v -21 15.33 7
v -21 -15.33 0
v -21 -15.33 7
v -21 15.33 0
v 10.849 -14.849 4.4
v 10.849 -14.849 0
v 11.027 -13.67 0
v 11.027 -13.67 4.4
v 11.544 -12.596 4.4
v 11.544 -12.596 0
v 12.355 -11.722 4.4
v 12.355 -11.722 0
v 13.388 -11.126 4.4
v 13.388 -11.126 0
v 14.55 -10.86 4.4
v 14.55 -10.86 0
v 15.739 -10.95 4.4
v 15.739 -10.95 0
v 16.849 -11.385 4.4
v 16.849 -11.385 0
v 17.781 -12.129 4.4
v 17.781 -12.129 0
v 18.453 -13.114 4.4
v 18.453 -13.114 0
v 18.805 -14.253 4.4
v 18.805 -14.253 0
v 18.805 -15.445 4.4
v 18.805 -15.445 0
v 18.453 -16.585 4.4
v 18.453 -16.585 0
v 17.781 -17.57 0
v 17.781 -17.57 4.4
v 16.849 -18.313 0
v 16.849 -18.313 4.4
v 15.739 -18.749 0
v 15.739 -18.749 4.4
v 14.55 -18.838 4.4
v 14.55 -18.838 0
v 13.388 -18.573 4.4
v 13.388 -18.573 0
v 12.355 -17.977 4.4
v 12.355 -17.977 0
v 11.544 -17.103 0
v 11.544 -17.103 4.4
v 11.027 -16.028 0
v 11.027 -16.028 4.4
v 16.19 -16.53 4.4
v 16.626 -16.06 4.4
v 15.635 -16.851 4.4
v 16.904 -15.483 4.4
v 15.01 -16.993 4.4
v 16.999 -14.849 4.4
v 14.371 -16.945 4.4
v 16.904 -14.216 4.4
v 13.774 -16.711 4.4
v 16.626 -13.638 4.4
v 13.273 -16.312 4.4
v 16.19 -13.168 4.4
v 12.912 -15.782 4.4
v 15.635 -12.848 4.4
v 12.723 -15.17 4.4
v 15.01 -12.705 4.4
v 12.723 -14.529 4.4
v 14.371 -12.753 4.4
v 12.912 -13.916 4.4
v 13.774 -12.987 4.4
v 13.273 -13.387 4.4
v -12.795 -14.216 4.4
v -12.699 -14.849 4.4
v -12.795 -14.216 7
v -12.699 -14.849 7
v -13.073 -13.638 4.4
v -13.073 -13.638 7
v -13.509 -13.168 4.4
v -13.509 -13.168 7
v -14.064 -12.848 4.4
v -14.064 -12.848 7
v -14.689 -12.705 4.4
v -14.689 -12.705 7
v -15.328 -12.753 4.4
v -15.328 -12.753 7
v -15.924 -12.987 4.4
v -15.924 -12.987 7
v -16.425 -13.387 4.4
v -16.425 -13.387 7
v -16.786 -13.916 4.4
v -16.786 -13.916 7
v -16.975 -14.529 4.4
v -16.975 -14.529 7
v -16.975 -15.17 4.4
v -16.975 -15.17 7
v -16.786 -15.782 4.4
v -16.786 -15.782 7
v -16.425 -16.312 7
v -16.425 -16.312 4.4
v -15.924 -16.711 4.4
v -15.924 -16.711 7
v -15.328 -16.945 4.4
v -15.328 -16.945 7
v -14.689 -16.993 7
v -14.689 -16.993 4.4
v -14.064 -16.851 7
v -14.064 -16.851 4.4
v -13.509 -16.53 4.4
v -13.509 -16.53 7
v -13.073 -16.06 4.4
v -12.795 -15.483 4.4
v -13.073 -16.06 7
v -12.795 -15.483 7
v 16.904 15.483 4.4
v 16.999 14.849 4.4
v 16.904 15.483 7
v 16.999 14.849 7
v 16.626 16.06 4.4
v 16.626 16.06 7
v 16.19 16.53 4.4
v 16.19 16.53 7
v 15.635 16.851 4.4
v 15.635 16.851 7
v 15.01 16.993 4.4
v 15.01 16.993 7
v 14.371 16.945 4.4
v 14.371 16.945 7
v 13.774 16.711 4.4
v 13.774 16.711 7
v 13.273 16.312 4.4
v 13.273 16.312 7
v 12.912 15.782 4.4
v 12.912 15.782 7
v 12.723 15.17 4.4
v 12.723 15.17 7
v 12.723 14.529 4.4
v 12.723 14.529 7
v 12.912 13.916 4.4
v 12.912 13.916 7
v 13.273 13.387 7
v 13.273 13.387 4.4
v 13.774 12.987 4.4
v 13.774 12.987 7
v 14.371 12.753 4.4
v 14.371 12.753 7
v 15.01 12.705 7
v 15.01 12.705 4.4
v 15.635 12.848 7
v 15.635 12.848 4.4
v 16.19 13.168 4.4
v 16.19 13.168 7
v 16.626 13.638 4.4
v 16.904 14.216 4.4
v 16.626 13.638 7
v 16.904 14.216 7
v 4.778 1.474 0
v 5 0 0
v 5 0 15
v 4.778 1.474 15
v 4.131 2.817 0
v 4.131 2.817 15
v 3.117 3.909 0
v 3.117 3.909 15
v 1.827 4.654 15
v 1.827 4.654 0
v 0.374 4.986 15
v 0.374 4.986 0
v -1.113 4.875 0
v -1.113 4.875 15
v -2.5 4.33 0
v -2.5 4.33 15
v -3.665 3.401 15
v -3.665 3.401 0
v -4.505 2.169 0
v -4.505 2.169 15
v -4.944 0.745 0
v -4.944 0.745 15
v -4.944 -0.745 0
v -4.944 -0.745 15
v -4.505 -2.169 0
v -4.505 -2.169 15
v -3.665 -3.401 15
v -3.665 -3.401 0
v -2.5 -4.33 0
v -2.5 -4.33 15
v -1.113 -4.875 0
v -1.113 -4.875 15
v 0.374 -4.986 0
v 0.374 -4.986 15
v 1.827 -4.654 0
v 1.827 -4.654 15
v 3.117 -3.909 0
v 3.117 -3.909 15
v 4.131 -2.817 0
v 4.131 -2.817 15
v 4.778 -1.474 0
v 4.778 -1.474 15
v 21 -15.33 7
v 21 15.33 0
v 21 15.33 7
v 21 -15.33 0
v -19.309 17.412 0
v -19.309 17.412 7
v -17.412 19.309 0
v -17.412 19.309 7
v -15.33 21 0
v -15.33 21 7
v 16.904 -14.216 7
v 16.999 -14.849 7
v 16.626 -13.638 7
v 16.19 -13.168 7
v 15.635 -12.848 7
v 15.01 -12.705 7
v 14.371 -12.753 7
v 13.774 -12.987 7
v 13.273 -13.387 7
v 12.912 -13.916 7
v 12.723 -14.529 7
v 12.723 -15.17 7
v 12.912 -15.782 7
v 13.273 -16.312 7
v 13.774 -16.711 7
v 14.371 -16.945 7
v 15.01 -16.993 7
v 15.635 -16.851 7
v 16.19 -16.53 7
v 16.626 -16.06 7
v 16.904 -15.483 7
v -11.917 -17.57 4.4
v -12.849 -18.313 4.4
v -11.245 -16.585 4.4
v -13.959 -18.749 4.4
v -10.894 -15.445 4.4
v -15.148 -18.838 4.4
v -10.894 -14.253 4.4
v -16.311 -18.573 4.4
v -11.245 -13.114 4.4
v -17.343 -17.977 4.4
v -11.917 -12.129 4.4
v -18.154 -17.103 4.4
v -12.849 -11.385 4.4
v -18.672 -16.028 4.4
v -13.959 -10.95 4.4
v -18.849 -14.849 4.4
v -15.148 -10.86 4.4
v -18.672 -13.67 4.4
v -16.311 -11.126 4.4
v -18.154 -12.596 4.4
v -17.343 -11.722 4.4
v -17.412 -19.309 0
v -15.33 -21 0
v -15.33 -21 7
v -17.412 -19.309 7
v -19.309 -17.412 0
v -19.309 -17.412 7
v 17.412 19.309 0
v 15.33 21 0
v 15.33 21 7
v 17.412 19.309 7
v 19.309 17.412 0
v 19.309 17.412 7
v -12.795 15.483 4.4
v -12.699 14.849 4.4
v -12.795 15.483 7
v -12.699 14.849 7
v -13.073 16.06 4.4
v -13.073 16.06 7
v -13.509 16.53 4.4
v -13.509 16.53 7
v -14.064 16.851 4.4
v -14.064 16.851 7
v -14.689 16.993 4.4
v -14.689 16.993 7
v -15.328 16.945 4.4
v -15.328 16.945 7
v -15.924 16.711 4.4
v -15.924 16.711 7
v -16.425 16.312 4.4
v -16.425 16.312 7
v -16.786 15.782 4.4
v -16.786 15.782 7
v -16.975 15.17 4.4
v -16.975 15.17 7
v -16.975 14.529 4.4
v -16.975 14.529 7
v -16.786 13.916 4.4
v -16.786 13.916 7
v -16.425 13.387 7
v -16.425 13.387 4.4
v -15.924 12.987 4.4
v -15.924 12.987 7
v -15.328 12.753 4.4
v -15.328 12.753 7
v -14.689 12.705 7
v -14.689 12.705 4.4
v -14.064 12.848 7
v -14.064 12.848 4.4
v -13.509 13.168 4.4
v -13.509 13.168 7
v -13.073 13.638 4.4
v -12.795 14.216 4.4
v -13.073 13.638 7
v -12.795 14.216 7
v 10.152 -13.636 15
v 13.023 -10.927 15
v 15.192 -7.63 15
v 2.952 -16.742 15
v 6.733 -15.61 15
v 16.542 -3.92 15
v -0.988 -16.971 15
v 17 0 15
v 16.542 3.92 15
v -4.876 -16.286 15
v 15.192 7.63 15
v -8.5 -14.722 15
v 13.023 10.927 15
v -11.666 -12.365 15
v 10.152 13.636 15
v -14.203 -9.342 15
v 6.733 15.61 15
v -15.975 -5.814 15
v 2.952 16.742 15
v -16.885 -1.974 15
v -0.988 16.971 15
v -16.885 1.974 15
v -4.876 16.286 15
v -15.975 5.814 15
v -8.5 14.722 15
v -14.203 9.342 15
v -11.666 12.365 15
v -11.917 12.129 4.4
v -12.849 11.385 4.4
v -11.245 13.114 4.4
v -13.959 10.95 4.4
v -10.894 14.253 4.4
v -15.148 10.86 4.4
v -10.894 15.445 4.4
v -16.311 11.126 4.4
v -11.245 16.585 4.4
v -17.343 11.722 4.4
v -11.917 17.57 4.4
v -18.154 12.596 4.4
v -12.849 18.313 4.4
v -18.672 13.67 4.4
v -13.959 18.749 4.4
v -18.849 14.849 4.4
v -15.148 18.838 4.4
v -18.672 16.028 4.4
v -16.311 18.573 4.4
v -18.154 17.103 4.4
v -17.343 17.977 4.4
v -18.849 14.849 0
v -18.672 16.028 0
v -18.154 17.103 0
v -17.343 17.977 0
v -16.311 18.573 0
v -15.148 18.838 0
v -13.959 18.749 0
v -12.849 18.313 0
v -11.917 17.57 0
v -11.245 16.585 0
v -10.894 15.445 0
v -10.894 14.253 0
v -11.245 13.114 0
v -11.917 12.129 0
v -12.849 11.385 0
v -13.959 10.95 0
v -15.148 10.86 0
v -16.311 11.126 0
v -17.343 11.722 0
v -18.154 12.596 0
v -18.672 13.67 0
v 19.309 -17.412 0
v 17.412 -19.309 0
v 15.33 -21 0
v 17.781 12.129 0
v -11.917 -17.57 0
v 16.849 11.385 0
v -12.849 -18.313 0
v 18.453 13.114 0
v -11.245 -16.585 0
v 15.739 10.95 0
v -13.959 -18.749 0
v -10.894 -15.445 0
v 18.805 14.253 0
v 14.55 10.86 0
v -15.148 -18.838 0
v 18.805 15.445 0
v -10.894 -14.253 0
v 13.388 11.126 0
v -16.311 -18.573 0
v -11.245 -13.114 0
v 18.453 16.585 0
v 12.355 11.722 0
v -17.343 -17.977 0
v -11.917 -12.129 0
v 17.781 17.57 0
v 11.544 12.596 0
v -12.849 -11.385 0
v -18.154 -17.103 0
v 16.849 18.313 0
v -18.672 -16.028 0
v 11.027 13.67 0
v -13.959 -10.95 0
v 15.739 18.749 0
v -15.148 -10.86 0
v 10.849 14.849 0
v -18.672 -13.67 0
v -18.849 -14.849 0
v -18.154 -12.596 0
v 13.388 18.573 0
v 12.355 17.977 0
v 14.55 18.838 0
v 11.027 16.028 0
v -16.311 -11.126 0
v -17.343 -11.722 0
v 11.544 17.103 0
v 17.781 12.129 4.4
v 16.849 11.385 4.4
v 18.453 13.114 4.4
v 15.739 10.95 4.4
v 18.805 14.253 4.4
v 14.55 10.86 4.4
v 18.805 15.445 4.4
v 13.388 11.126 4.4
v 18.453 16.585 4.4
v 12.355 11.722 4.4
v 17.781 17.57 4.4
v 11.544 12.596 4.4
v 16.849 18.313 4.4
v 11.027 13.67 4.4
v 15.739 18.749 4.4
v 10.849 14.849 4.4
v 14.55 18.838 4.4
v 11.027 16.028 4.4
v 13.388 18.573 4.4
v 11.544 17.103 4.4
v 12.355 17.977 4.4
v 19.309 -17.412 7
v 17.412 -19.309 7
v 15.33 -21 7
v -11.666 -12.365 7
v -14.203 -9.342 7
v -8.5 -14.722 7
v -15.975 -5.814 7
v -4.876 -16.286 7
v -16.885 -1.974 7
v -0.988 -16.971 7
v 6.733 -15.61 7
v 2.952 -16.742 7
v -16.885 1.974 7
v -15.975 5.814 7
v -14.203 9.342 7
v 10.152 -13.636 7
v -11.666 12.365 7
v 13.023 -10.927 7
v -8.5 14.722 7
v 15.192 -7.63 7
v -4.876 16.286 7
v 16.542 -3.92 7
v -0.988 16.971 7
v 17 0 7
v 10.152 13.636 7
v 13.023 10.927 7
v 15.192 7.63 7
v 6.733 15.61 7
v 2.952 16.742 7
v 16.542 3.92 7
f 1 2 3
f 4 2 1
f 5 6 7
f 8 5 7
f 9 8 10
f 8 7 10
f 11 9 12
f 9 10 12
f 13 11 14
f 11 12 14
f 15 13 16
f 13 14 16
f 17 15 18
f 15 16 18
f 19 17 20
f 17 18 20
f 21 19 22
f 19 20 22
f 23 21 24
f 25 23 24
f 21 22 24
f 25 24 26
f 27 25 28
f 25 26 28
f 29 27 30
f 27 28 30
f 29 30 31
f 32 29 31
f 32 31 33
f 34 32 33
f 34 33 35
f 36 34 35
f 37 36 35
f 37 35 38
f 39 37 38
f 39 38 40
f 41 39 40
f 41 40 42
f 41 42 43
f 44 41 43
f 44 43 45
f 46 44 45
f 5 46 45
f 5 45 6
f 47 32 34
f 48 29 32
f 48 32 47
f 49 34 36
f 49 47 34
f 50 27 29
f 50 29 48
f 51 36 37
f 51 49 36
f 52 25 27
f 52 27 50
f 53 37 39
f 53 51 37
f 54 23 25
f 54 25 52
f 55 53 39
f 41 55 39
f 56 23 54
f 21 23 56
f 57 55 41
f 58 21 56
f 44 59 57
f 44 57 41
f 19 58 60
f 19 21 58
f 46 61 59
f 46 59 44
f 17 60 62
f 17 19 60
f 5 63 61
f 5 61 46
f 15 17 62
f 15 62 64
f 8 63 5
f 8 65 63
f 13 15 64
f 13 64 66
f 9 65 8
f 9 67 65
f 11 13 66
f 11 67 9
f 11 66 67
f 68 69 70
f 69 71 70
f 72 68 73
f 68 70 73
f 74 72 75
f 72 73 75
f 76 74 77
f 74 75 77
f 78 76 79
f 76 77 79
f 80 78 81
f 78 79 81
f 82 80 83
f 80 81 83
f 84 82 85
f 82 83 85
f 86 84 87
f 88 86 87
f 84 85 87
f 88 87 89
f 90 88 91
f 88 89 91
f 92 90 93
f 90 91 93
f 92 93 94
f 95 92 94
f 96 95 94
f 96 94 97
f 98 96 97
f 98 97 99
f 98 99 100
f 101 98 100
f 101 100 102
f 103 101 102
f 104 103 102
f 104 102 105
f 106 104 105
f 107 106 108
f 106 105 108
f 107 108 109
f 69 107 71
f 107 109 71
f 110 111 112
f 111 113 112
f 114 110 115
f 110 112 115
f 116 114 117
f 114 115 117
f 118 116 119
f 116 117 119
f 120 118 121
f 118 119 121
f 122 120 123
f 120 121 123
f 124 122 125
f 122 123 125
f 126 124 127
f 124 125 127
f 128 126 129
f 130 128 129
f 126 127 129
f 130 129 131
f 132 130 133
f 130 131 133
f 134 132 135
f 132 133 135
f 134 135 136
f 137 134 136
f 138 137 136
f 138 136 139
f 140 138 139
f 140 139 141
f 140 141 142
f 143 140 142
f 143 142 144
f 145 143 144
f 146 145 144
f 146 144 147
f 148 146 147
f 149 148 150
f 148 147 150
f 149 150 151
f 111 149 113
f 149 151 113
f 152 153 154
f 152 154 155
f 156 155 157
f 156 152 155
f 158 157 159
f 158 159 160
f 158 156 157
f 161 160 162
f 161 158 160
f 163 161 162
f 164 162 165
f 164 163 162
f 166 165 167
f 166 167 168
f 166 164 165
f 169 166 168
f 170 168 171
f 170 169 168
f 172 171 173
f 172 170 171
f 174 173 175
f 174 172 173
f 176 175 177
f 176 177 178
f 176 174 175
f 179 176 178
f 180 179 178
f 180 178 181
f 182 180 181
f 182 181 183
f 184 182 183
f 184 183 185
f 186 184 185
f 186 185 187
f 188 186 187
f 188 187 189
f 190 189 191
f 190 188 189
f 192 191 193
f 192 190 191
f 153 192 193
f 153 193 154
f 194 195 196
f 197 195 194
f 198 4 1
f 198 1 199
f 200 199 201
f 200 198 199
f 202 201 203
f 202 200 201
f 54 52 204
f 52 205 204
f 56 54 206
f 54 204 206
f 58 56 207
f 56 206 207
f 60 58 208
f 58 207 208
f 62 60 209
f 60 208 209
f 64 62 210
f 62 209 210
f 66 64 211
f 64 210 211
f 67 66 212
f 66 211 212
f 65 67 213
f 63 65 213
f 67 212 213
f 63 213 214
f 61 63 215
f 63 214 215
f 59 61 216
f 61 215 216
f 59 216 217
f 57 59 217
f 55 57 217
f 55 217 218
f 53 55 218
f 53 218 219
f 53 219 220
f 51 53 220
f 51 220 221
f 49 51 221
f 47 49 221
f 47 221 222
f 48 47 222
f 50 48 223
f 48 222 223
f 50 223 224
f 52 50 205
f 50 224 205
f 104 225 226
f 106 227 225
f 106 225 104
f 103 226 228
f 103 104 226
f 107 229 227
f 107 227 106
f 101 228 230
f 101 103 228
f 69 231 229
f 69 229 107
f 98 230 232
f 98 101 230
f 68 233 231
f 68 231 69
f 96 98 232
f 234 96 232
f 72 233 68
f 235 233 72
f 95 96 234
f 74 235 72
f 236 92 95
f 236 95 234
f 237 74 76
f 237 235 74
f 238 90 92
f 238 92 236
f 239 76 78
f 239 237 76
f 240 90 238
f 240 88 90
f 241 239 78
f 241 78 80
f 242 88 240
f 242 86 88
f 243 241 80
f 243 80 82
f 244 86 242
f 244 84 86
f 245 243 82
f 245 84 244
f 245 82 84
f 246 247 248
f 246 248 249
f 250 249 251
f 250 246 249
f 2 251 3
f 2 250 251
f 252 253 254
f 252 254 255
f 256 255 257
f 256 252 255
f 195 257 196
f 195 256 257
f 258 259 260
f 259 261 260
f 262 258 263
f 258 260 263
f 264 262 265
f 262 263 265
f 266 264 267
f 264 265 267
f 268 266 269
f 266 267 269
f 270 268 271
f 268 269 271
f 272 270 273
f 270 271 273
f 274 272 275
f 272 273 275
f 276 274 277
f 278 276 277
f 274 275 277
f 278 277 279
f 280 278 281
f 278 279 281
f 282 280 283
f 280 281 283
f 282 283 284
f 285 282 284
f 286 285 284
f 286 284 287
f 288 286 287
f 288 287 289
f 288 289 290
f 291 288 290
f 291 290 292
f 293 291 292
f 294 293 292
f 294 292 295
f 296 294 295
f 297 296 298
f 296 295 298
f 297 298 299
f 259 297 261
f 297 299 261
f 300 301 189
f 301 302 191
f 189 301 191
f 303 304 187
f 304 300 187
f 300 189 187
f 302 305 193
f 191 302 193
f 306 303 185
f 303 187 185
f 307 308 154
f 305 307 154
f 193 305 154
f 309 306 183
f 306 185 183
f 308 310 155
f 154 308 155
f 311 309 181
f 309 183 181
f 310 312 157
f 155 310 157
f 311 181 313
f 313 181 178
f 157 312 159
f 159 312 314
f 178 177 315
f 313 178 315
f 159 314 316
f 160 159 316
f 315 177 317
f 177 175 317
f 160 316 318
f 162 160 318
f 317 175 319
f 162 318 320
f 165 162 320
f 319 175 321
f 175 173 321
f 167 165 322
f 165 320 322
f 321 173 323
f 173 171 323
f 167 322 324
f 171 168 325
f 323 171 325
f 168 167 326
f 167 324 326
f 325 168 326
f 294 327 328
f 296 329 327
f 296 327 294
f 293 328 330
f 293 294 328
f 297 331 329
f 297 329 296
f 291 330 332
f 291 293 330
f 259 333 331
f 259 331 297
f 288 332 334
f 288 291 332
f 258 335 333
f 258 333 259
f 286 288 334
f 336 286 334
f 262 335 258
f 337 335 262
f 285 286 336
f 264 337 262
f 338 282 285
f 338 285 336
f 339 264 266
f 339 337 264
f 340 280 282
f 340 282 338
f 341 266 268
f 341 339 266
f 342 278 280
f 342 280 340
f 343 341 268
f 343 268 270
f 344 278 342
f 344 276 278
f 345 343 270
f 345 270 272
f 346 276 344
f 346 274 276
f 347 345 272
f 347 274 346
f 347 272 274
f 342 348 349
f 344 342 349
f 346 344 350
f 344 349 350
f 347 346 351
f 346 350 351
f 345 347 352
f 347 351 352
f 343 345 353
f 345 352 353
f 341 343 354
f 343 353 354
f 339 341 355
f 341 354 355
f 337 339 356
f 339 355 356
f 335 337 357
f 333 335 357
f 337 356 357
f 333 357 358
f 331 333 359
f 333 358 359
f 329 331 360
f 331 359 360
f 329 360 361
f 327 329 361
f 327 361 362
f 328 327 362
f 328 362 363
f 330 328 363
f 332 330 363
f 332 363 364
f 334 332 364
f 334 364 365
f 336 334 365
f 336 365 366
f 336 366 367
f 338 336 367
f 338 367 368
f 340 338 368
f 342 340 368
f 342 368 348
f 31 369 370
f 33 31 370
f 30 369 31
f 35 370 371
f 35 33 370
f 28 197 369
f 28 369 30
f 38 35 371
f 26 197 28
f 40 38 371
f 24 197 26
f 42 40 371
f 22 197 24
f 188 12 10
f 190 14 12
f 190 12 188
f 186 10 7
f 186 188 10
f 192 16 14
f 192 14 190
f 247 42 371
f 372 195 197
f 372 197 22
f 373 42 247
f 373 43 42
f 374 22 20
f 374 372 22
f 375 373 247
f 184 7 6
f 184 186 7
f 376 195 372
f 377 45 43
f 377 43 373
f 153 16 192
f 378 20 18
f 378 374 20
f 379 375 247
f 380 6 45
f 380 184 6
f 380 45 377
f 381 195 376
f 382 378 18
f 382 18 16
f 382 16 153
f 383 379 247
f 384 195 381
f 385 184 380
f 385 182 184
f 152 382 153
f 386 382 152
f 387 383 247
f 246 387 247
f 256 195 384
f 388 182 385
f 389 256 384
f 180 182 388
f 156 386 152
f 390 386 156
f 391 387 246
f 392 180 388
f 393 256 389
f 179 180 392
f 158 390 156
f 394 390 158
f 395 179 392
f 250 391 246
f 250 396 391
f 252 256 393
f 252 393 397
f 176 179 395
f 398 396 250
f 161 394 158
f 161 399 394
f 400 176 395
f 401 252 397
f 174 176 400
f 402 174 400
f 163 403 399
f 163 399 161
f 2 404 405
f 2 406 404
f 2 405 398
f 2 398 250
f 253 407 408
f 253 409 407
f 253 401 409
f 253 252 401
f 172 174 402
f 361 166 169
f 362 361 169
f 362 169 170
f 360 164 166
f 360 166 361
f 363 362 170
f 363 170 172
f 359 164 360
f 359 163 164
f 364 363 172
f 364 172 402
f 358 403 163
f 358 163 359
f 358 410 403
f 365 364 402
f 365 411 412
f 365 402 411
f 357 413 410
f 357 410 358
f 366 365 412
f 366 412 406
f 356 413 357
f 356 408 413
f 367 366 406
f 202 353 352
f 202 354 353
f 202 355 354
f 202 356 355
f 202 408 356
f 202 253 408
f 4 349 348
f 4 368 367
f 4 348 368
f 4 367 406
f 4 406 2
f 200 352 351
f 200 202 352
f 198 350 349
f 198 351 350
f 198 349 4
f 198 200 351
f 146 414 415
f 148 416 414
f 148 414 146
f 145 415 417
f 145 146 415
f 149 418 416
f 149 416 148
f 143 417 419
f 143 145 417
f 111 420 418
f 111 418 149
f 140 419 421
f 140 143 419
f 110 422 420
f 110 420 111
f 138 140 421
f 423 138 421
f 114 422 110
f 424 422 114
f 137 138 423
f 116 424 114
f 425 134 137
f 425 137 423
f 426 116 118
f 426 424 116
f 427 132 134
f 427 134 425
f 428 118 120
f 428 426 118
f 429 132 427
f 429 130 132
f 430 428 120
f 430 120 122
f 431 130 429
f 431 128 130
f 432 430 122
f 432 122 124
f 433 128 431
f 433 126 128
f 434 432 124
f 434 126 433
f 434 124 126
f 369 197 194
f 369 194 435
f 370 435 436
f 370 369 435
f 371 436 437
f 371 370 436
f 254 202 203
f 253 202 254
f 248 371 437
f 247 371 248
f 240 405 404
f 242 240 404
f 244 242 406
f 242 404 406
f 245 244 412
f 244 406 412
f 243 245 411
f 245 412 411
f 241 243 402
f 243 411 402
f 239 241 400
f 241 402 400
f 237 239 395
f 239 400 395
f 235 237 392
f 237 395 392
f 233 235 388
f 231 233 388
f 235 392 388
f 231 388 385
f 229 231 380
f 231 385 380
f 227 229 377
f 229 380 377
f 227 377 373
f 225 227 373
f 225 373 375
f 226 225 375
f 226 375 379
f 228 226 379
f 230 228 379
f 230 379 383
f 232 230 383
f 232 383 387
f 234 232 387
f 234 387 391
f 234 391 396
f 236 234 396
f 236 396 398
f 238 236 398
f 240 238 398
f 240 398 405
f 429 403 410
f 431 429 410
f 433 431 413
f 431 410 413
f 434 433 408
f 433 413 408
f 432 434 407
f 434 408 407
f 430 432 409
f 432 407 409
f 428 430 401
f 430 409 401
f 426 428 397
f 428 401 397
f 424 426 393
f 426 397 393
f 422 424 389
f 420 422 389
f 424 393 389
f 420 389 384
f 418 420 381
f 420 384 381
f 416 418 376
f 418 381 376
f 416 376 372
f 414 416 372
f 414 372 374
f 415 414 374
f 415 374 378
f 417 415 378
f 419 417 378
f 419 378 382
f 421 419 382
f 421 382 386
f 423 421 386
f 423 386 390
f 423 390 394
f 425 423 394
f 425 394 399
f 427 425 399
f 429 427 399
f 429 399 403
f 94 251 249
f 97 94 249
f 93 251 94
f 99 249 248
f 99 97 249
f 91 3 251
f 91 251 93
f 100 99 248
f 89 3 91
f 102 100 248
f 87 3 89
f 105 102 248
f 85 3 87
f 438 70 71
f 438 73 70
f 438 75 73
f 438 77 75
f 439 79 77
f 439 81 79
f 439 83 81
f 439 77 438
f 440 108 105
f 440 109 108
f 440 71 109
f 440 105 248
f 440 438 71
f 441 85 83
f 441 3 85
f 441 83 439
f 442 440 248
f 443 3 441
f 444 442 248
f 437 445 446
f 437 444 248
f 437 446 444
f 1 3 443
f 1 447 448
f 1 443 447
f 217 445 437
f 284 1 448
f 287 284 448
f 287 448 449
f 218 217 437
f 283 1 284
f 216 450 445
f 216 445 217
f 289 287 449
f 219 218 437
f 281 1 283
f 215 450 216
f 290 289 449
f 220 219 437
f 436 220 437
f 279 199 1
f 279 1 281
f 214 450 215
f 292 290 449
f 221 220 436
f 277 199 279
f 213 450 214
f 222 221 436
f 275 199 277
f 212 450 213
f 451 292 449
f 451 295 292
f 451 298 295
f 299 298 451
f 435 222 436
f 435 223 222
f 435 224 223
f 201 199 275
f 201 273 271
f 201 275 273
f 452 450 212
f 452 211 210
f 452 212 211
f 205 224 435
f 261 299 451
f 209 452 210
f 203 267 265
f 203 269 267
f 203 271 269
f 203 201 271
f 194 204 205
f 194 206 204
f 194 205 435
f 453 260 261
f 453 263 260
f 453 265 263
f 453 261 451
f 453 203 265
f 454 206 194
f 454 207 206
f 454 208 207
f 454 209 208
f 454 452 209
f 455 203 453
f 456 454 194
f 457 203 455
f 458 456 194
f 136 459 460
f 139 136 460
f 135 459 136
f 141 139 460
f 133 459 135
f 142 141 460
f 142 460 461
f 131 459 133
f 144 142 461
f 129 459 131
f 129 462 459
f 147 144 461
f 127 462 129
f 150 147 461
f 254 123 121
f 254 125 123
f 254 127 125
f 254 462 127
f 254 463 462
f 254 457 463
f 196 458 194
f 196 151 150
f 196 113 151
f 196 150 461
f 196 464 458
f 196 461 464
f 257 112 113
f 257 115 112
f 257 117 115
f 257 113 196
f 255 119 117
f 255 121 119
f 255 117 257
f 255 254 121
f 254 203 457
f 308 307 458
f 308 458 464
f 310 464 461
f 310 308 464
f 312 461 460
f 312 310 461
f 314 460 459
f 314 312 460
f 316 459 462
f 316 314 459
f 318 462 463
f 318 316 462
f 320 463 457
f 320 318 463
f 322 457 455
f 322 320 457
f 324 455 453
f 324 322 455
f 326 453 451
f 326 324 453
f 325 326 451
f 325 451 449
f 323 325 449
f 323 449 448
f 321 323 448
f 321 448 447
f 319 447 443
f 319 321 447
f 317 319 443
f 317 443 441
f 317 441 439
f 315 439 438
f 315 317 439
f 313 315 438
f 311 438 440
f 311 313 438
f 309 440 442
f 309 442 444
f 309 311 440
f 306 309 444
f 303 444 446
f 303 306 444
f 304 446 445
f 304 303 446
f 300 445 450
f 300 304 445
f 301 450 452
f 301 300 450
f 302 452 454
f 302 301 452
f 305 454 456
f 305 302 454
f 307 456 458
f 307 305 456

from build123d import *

# Parameters (mm, degrees)
SKETCH1_R                                           = 5
BOSS_EXTRUDE1_DEPTH                                 = 15
SKETCH2_R                                           = 27
SKETCH2_R_2                                         = 17
CUT_EXTRUDE_THIN1_DEPTH                             = 8
CBORE_FOR_M4_HEX_SOCKET_HEAD_CAP_SCREW1_D           = 4.3
CBORE_FOR_M4_HEX_SOCKET_HEAD_CAP_SCREW1_DEPTH       = 8.5
CBORE_FOR_M4_HEX_SOCKET_HEAD_CAP_SCREW1_CBORE_D     = 8
CBORE_FOR_M4_HEX_SOCKET_HEAD_CAP_SCREW1_CBORE_DEPTH = 4.4
CBORE_FOR_M4_HEX_SOCKET_HEAD_CAP_SCREW1_TIP         = 1.291850331
CBORE_FOR_M4_HEX_SOCKET_HEAD_CAP_SCREW2_D           = 4.3
CBORE_FOR_M4_HEX_SOCKET_HEAD_CAP_SCREW2_DEPTH       = 8.5
CBORE_FOR_M4_HEX_SOCKET_HEAD_CAP_SCREW2_CBORE_D     = 8
CBORE_FOR_M4_HEX_SOCKET_HEAD_CAP_SCREW2_CBORE_DEPTH = 4.4
CBORE_FOR_M4_HEX_SOCKET_HEAD_CAP_SCREW2_TIP         = 1.291850331
CBORE_FOR_M4_HEX_SOCKET_HEAD_CAP_SCREW3_D           = 4.3
CBORE_FOR_M4_HEX_SOCKET_HEAD_CAP_SCREW3_DEPTH       = 8.5
CBORE_FOR_M4_HEX_SOCKET_HEAD_CAP_SCREW3_CBORE_D     = 8
CBORE_FOR_M4_HEX_SOCKET_HEAD_CAP_SCREW3_CBORE_DEPTH = 4.4
CBORE_FOR_M4_HEX_SOCKET_HEAD_CAP_SCREW3_TIP         = 1.291850331
CBORE_FOR_M4_HEX_SOCKET_HEAD_CAP_SCREW4_D           = 4.3
CBORE_FOR_M4_HEX_SOCKET_HEAD_CAP_SCREW4_DEPTH       = 8.5
CBORE_FOR_M4_HEX_SOCKET_HEAD_CAP_SCREW4_CBORE_D     = 8
CBORE_FOR_M4_HEX_SOCKET_HEAD_CAP_SCREW4_CBORE_DEPTH = 4.4
CBORE_FOR_M4_HEX_SOCKET_HEAD_CAP_SCREW4_TIP         = 1.291850331


with BuildPart() as part:
    # Sketch1 → Boss-Extrude1 (new body)
    with BuildSketch(Plane.XY):
        with BuildLine():
            Line((15.329709717, -21), (-15.329709717, -21))
            ThreePointArc((-15.329709717, -21), (-18.384776311, -18.384776311), (-21, -15.329709717))
            Line((-21, -15.329709717), (-21, 15.329709717))
            ThreePointArc((-21, 15.329709717), (-18.384776311, 18.384776311), (-15.329709717, 21))
            Line((-15.329709717, 21), (15.329709717, 21))
            ThreePointArc((15.329709717, 21), (18.384776311, 18.384776311), (21, 15.329709717))
            Line((21, 15.329709717), (21, -15.329709717))
            ThreePointArc((21, -15.329709717), (18.384776311, -18.384776311), (15.329709717, -21))
        make_face()
        Circle(SKETCH1_R, mode=Mode.SUBTRACT)
    extrude(amount=BOSS_EXTRUDE1_DEPTH)

    # Sketch2 → Cut-Extrude-Thin1 (cut)
    with BuildSketch(Plane.XY.offset(15)):
        Circle(SKETCH2_R)
        Circle(SKETCH2_R_2, mode=Mode.SUBTRACT)
    extrude(amount=-CUT_EXTRUDE_THIN1_DEPTH, mode=Mode.SUBTRACT)

    # CBORE for M4 Hex Socket Head Cap Screw1
    with Locations(Plane(origin=(-14.849242405, 14.849242405, 0), x_dir=(-1, 0, 0), z_dir=(0, 0, -1))):
        with Locations((0, 0)):
            CounterBoreHole(CBORE_FOR_M4_HEX_SOCKET_HEAD_CAP_SCREW1_D / 2, CBORE_FOR_M4_HEX_SOCKET_HEAD_CAP_SCREW1_CBORE_D / 2, CBORE_FOR_M4_HEX_SOCKET_HEAD_CAP_SCREW1_CBORE_DEPTH, depth=CBORE_FOR_M4_HEX_SOCKET_HEAD_CAP_SCREW1_DEPTH)
            with Locations((0, 0, -(CBORE_FOR_M4_HEX_SOCKET_HEAD_CAP_SCREW1_DEPTH + CBORE_FOR_M4_HEX_SOCKET_HEAD_CAP_SCREW1_TIP / 2))):  # 118° drill point
                Cone(0, CBORE_FOR_M4_HEX_SOCKET_HEAD_CAP_SCREW1_D / 2, CBORE_FOR_M4_HEX_SOCKET_HEAD_CAP_SCREW1_TIP, mode=Mode.SUBTRACT)

    # CBORE for M4 Hex Socket Head Cap Screw2
    with Locations(Plane(origin=(14.849242405, 14.849242405, 0), x_dir=(-1, 0, 0), z_dir=(0, 0, -1))):
        with Locations((0, 0)):
            CounterBoreHole(CBORE_FOR_M4_HEX_SOCKET_HEAD_CAP_SCREW2_D / 2, CBORE_FOR_M4_HEX_SOCKET_HEAD_CAP_SCREW2_CBORE_D / 2, CBORE_FOR_M4_HEX_SOCKET_HEAD_CAP_SCREW2_CBORE_DEPTH, depth=CBORE_FOR_M4_HEX_SOCKET_HEAD_CAP_SCREW2_DEPTH)
            with Locations((0, 0, -(CBORE_FOR_M4_HEX_SOCKET_HEAD_CAP_SCREW2_DEPTH + CBORE_FOR_M4_HEX_SOCKET_HEAD_CAP_SCREW2_TIP / 2))):  # 118° drill point
                Cone(0, CBORE_FOR_M4_HEX_SOCKET_HEAD_CAP_SCREW2_D / 2, CBORE_FOR_M4_HEX_SOCKET_HEAD_CAP_SCREW2_TIP, mode=Mode.SUBTRACT)

    # CBORE for M4 Hex Socket Head Cap Screw3
    with Locations(Plane(origin=(14.849242405, -14.849242405, 0), x_dir=(-1, 0, 0), z_dir=(0, 0, -1))):
        with Locations((0, 0)):
            CounterBoreHole(CBORE_FOR_M4_HEX_SOCKET_HEAD_CAP_SCREW3_D / 2, CBORE_FOR_M4_HEX_SOCKET_HEAD_CAP_SCREW3_CBORE_D / 2, CBORE_FOR_M4_HEX_SOCKET_HEAD_CAP_SCREW3_CBORE_DEPTH, depth=CBORE_FOR_M4_HEX_SOCKET_HEAD_CAP_SCREW3_DEPTH)
            with Locations((0, 0, -(CBORE_FOR_M4_HEX_SOCKET_HEAD_CAP_SCREW3_DEPTH + CBORE_FOR_M4_HEX_SOCKET_HEAD_CAP_SCREW3_TIP / 2))):  # 118° drill point
                Cone(0, CBORE_FOR_M4_HEX_SOCKET_HEAD_CAP_SCREW3_D / 2, CBORE_FOR_M4_HEX_SOCKET_HEAD_CAP_SCREW3_TIP, mode=Mode.SUBTRACT)

    # CBORE for M4 Hex Socket Head Cap Screw4
    with Locations(Plane(origin=(-14.849242405, -14.849242405, 0), x_dir=(-1, 0, 0), z_dir=(0, 0, -1))):
        with Locations((0, 0)):
            CounterBoreHole(CBORE_FOR_M4_HEX_SOCKET_HEAD_CAP_SCREW4_D / 2, CBORE_FOR_M4_HEX_SOCKET_HEAD_CAP_SCREW4_CBORE_D / 2, CBORE_FOR_M4_HEX_SOCKET_HEAD_CAP_SCREW4_CBORE_DEPTH, depth=CBORE_FOR_M4_HEX_SOCKET_HEAD_CAP_SCREW4_DEPTH)
            with Locations((0, 0, -(CBORE_FOR_M4_HEX_SOCKET_HEAD_CAP_SCREW4_DEPTH + CBORE_FOR_M4_HEX_SOCKET_HEAD_CAP_SCREW4_TIP / 2))):  # 118° drill point
                Cone(0, CBORE_FOR_M4_HEX_SOCKET_HEAD_CAP_SCREW4_D / 2, CBORE_FOR_M4_HEX_SOCKET_HEAD_CAP_SCREW4_TIP, mode=Mode.SUBTRACT)


solid = part.part
